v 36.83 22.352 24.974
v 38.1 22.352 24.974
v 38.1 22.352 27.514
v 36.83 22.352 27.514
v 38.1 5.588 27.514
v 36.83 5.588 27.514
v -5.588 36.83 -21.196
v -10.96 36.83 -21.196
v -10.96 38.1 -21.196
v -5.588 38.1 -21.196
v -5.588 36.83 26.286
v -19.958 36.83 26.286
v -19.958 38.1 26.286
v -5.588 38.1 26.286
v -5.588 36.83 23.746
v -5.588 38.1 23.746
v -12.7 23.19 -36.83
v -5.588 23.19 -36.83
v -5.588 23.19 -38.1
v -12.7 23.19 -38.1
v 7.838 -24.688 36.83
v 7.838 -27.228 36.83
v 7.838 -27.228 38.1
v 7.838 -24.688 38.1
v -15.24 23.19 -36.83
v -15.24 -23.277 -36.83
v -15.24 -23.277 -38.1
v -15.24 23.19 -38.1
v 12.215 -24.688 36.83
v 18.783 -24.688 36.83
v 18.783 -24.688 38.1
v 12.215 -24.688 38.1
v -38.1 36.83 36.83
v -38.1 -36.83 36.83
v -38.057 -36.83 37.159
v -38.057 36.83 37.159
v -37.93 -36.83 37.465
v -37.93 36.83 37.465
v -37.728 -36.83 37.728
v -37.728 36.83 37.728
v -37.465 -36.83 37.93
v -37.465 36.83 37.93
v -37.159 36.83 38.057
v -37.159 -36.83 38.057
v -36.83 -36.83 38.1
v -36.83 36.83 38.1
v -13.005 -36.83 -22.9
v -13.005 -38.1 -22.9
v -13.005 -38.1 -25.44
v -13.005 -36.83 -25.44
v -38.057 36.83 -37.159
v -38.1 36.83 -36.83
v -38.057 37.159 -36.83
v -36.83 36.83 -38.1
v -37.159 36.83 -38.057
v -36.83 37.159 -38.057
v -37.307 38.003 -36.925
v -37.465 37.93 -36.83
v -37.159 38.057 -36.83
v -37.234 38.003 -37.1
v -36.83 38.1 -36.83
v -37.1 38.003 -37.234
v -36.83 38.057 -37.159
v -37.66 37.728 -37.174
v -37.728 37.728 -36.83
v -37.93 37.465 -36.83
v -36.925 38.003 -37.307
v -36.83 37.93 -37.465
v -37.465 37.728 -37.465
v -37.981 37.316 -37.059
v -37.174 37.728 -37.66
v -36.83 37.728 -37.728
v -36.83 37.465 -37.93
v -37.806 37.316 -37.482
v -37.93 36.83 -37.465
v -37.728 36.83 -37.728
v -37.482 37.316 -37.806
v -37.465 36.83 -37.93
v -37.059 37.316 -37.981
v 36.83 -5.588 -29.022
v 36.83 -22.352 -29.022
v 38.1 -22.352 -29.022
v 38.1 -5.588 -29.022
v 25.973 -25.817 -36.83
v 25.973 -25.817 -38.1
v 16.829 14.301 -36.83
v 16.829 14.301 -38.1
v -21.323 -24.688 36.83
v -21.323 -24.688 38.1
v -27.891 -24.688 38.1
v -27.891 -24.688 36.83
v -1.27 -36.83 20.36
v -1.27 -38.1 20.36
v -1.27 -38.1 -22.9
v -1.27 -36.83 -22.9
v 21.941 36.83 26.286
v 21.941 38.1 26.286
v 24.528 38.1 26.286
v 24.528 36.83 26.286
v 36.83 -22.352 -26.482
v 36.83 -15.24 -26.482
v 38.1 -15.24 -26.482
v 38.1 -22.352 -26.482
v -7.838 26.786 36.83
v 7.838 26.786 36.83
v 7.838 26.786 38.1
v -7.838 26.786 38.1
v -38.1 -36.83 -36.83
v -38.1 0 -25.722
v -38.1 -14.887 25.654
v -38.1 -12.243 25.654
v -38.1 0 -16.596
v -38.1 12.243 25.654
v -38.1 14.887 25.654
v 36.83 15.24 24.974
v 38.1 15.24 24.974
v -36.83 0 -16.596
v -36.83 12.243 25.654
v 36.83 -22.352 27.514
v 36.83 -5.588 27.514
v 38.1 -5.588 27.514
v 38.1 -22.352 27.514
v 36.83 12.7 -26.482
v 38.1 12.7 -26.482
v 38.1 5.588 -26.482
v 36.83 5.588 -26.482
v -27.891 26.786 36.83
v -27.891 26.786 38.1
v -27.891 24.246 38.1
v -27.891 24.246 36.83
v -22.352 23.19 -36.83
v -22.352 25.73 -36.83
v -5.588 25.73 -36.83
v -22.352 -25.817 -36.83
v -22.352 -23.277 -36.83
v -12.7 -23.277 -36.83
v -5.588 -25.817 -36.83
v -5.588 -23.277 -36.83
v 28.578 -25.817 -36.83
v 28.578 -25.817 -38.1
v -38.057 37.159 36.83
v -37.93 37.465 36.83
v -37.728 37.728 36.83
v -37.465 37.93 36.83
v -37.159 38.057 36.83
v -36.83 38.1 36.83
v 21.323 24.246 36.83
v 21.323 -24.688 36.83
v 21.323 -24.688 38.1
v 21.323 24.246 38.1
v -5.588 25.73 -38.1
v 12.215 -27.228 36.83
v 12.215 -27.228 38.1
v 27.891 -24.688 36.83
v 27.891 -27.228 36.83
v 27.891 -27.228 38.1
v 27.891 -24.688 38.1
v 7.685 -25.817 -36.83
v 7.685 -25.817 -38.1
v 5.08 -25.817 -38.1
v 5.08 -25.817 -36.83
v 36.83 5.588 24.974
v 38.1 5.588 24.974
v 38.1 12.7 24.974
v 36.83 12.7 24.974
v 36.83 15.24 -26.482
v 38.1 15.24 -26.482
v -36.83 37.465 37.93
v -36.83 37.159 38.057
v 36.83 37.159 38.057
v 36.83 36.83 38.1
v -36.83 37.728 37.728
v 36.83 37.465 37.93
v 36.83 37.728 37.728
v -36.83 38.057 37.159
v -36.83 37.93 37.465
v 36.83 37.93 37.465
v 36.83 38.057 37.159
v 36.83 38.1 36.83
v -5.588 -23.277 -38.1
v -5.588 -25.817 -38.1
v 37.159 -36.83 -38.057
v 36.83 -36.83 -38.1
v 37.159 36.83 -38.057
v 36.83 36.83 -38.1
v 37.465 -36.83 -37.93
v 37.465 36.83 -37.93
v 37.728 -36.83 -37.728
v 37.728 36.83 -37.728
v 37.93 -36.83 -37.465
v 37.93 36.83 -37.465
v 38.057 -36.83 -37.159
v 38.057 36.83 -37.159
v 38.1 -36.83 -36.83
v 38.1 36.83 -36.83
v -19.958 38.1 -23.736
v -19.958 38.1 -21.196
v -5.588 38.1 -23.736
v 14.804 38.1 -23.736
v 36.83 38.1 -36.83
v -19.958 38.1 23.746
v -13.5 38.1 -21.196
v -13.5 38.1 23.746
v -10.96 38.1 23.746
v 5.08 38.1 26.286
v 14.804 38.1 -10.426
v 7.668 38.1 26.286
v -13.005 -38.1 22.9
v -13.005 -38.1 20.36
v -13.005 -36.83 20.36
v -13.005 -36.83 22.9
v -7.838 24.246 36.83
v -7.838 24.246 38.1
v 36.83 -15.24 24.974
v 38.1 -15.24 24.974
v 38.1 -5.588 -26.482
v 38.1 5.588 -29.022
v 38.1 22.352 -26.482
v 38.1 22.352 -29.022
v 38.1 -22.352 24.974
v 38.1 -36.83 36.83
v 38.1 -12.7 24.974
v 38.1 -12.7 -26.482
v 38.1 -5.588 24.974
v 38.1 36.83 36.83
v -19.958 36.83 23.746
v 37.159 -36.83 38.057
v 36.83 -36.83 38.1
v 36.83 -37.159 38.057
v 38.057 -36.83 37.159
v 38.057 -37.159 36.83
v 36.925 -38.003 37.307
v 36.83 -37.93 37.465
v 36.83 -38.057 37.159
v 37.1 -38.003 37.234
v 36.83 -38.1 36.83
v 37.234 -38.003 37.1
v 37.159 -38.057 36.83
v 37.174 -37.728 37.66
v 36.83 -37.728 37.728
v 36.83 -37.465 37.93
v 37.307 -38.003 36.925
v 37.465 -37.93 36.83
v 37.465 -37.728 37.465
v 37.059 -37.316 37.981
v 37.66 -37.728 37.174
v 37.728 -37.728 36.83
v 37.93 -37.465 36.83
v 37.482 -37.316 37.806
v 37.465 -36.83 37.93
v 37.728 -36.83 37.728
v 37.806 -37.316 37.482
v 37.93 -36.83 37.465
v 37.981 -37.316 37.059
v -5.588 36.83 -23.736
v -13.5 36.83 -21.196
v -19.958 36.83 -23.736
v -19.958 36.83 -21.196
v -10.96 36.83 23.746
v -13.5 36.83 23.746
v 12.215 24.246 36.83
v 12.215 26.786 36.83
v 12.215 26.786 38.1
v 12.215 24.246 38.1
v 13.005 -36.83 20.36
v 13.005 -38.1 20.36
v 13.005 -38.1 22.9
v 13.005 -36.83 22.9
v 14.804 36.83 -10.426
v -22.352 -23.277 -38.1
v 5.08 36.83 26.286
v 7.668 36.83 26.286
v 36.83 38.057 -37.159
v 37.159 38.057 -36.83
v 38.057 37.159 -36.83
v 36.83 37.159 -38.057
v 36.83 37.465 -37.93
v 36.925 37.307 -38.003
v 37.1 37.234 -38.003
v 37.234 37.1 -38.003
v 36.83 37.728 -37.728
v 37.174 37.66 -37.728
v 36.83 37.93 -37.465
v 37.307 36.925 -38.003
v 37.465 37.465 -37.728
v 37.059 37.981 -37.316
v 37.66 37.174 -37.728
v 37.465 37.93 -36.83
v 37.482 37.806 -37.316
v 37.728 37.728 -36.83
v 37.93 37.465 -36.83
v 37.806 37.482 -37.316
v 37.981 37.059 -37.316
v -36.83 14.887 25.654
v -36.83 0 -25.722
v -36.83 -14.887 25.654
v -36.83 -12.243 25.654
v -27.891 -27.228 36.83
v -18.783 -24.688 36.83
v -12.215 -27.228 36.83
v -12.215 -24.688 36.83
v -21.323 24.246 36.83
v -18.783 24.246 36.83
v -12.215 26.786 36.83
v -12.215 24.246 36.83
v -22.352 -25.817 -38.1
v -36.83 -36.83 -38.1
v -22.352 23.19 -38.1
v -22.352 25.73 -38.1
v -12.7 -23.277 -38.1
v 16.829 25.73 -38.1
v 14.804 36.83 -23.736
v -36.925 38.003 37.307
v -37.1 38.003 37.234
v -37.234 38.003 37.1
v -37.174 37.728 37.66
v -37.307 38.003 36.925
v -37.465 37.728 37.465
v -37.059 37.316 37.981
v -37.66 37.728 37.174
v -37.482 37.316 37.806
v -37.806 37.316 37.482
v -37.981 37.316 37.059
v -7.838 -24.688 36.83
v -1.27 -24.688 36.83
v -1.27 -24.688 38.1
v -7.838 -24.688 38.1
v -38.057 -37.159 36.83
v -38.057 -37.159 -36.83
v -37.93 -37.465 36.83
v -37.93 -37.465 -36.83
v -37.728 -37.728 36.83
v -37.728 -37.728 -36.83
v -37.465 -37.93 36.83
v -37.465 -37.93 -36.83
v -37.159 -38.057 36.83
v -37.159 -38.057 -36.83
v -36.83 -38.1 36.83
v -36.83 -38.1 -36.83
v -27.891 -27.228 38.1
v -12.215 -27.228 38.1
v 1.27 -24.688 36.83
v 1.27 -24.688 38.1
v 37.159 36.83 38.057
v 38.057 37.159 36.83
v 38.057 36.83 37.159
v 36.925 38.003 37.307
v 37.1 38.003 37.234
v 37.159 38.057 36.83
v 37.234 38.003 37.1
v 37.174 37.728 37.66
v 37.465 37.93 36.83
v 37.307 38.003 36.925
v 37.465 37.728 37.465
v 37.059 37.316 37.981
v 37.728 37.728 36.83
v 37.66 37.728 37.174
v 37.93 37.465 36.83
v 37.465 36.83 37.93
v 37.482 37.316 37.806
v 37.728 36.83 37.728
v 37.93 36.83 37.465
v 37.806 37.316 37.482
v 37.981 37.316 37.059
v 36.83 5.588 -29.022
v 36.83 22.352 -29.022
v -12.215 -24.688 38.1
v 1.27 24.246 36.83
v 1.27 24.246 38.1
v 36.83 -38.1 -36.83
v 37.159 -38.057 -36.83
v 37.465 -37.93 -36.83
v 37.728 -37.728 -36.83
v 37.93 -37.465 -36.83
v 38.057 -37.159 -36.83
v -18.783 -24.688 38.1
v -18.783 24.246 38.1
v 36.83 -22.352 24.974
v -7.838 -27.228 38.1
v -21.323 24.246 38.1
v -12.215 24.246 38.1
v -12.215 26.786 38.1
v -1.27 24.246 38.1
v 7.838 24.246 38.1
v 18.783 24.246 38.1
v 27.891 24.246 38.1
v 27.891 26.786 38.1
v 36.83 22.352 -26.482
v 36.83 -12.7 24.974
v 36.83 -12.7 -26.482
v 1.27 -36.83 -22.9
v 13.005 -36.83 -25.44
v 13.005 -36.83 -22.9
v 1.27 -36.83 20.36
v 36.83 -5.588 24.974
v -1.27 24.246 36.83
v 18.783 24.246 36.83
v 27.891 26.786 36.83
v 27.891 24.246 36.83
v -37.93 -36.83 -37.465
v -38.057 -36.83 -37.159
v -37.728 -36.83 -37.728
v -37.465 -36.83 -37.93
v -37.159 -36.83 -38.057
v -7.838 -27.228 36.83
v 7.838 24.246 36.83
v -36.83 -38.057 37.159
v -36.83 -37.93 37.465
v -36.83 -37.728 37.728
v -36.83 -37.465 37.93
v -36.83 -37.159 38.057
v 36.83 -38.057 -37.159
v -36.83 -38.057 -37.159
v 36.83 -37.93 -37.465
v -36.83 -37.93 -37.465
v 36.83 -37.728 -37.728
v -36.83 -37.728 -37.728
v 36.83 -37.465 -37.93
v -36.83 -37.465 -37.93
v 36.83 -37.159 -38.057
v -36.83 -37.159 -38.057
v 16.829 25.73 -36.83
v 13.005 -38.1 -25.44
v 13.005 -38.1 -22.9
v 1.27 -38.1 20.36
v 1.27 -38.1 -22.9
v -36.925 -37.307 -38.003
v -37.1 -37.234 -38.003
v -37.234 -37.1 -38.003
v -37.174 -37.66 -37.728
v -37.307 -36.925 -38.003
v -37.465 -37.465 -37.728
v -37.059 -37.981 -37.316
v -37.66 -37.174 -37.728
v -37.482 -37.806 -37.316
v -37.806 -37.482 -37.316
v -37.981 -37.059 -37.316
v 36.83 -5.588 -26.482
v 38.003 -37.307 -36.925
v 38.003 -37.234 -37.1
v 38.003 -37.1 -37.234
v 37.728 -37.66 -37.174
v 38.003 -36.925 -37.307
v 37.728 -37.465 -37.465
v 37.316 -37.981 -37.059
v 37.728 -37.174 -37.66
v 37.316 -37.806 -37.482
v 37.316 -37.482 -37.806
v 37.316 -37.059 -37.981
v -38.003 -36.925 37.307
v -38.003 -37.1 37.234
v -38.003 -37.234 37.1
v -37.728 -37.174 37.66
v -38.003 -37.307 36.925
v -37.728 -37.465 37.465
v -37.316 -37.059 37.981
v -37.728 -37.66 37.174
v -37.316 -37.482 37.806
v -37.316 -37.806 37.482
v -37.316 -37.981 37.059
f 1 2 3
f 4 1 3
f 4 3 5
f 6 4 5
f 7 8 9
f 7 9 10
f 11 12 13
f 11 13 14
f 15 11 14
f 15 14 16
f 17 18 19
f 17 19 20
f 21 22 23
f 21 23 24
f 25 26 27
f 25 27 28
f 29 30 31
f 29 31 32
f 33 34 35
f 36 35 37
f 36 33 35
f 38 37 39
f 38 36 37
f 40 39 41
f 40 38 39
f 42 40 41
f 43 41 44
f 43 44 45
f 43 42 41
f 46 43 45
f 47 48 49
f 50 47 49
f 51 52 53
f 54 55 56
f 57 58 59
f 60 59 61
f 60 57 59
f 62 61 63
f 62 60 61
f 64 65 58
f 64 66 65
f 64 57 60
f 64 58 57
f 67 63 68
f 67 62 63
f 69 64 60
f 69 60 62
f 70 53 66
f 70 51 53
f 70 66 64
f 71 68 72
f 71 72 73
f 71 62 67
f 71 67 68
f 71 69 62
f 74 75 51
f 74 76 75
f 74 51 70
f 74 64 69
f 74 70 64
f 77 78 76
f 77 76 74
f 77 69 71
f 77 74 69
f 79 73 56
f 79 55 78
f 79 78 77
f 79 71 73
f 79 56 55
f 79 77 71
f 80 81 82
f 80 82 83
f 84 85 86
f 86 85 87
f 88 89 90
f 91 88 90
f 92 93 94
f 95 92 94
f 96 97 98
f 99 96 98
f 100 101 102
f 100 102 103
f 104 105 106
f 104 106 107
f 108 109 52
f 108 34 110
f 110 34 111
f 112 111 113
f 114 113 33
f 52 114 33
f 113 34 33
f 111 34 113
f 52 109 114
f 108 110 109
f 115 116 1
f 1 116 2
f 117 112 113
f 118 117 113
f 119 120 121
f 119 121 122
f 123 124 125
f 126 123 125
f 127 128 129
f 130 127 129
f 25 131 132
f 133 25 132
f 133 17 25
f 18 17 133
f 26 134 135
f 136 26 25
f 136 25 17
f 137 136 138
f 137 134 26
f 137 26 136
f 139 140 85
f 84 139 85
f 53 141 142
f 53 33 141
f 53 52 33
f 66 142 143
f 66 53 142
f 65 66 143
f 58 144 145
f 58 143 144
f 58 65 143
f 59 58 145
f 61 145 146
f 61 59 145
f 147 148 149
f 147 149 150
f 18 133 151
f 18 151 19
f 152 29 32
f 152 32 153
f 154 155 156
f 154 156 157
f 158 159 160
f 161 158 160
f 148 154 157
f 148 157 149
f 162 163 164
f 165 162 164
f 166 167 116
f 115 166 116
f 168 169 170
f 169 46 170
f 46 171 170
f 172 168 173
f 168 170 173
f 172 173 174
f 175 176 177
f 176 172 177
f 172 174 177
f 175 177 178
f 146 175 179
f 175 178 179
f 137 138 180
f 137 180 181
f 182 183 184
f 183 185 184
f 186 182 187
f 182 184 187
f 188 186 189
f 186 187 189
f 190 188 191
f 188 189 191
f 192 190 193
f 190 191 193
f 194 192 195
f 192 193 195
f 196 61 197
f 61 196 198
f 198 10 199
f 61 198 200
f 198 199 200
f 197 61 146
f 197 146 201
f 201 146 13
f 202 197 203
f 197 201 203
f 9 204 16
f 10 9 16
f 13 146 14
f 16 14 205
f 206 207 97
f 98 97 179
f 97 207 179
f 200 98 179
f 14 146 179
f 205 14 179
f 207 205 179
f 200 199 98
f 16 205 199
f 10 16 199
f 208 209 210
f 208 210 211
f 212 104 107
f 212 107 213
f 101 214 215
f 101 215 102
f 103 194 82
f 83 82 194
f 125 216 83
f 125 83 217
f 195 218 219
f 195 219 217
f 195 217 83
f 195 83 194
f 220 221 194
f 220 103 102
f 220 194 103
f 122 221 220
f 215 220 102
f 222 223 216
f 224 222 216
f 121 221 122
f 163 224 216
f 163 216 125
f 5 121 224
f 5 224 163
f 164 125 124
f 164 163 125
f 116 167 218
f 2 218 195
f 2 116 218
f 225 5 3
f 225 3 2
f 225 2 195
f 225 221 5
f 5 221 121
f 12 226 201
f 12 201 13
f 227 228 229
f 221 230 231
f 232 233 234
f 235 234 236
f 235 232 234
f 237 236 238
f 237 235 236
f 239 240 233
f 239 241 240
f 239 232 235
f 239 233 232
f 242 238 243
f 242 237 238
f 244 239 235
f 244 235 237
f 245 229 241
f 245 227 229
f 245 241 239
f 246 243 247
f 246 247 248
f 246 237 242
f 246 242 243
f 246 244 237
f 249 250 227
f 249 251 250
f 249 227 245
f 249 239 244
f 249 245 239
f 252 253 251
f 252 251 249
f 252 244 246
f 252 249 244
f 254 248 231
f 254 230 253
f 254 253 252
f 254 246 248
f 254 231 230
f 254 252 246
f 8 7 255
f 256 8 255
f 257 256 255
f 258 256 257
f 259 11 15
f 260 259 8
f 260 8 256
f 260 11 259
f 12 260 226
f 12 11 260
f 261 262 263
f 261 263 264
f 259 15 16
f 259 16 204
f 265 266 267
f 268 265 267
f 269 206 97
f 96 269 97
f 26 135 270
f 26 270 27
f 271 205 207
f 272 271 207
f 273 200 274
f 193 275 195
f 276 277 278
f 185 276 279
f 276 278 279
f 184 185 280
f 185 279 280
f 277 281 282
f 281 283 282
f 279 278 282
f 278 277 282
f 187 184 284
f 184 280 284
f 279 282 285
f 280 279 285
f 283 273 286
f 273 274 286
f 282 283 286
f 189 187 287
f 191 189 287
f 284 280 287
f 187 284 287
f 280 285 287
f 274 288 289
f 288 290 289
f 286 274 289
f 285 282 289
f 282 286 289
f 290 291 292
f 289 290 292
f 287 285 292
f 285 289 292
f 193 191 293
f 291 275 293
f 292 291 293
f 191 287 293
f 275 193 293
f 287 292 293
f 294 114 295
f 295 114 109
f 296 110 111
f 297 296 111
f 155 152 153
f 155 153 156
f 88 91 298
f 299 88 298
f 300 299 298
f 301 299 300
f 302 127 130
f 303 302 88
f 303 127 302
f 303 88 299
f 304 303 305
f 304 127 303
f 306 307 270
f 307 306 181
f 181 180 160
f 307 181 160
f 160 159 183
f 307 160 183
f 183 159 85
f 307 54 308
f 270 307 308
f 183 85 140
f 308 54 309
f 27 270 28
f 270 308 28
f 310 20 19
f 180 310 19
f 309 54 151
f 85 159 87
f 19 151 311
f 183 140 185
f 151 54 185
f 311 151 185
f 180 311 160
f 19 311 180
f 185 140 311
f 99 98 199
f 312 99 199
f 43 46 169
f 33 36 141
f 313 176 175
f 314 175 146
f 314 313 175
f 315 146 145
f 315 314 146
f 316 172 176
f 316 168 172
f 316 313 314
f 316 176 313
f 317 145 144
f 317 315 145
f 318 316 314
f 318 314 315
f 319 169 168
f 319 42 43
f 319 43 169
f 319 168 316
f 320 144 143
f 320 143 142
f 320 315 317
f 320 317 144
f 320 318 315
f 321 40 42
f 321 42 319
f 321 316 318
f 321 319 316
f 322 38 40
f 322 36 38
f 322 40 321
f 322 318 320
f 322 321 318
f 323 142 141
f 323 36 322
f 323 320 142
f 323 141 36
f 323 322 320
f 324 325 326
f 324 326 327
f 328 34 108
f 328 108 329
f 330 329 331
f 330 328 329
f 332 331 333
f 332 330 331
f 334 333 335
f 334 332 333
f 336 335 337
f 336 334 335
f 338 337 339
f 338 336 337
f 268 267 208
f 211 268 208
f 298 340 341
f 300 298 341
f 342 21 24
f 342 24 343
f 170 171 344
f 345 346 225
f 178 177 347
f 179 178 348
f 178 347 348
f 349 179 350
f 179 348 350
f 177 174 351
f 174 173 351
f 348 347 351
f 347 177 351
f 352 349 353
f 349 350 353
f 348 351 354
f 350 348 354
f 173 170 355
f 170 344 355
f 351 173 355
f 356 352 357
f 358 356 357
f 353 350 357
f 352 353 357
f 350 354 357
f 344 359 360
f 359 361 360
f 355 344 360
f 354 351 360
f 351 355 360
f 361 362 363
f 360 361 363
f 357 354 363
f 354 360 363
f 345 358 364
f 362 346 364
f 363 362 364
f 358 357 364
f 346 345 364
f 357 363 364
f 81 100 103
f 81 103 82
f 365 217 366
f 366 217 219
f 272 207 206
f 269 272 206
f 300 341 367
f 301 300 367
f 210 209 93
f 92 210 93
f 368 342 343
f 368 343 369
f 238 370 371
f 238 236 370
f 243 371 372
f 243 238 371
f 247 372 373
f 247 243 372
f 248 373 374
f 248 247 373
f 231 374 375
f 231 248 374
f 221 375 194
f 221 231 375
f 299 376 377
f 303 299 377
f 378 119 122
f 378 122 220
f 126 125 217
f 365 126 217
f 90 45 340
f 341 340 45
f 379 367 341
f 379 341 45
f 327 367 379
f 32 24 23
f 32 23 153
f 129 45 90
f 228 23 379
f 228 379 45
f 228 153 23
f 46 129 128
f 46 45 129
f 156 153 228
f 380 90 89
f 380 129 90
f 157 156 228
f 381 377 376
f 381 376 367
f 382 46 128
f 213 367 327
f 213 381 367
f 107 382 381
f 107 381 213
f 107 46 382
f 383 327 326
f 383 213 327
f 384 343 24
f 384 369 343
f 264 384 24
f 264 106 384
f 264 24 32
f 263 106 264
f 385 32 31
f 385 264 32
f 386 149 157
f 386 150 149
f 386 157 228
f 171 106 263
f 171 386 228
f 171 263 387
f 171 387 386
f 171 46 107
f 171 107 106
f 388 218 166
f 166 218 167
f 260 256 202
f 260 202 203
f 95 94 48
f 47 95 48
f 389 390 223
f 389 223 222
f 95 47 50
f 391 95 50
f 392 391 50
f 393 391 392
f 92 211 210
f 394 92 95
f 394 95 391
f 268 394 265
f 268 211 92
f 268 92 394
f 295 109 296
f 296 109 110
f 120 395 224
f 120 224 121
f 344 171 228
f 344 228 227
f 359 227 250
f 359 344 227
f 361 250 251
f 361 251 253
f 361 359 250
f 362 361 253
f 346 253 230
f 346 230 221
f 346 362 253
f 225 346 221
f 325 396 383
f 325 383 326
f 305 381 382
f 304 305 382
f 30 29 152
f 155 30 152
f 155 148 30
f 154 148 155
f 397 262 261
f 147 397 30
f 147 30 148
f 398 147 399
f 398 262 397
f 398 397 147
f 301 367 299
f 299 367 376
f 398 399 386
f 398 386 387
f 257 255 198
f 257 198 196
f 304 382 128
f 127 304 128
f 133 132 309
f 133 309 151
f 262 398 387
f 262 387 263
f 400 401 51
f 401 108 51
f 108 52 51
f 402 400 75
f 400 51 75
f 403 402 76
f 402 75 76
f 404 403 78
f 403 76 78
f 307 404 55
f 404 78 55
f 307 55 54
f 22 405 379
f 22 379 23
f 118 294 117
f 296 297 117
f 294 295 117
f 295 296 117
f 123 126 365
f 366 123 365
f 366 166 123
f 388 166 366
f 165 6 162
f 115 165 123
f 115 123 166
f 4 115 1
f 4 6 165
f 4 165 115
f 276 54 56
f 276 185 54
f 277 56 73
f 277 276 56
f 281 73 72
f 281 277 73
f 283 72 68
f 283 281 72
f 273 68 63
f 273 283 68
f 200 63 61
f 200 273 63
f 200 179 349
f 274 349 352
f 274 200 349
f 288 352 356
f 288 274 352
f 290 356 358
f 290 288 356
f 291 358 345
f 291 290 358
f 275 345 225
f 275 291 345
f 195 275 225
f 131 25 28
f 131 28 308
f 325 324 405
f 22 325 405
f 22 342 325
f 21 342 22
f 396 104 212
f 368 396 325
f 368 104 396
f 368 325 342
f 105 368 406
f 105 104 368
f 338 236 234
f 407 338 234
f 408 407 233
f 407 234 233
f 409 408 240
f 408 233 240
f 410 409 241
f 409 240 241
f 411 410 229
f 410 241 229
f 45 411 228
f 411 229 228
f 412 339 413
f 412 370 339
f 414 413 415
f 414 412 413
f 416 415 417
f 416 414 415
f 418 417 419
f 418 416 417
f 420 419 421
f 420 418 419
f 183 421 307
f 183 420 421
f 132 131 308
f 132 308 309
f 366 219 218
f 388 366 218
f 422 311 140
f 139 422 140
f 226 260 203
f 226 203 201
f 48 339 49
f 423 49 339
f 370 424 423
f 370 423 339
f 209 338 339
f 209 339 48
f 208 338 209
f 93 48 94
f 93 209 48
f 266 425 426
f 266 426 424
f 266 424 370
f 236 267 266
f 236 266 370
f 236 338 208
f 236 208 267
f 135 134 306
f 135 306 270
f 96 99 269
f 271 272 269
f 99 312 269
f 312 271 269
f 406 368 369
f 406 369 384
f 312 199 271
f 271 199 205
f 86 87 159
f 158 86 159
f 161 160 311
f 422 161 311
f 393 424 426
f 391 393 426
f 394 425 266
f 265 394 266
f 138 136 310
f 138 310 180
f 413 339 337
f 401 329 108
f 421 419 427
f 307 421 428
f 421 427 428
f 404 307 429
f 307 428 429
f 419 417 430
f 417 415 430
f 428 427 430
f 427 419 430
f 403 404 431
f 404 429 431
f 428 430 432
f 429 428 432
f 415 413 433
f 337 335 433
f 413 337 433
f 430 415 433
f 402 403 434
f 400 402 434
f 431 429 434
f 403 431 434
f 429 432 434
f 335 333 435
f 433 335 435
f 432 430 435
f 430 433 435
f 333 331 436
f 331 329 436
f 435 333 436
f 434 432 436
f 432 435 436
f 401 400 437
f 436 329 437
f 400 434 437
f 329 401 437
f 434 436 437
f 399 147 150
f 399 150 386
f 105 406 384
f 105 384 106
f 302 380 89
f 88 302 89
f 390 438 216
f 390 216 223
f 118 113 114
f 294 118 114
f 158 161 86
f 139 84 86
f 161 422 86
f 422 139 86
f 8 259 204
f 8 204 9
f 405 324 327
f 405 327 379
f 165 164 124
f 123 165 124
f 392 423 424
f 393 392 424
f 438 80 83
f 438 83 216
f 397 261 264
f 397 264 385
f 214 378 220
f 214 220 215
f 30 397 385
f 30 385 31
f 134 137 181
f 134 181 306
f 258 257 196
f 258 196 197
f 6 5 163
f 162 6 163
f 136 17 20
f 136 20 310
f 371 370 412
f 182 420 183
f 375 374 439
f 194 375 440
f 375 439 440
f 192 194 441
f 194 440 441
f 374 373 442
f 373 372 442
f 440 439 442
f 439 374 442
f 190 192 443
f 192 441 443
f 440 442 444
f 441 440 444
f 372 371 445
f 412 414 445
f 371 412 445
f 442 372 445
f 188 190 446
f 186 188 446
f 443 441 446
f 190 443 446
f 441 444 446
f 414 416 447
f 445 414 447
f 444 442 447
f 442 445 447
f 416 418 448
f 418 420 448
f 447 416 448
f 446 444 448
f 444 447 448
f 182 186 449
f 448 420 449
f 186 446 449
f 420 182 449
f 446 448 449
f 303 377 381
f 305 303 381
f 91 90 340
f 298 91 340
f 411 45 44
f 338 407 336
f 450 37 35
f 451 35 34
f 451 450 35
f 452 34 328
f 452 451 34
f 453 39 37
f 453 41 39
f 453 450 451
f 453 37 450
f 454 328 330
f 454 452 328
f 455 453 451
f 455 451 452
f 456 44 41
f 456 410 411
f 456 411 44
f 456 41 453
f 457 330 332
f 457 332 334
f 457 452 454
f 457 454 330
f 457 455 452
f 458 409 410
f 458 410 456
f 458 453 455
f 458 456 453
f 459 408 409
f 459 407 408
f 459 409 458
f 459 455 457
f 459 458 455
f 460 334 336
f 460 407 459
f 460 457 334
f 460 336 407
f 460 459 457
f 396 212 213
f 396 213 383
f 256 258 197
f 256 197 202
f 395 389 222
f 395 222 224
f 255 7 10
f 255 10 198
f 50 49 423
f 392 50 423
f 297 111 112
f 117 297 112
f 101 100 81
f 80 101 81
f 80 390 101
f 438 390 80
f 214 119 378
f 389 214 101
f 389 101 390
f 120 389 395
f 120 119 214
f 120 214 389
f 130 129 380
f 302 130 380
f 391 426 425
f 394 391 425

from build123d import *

# Parameters (mm, degrees)
F0_W      = 76.2
F0_H      = 76.2
F1_DEPTH  = 38.1
F2_W      = 11.73516
F2_H      = 2.54
F3_DEPTH  = 1.27
F5_DEPTH  = 1.27
F7_DEPTH  = 1.27
F9_DEPTH  = 1.27
F11_DEPTH = 1.27
F13_DEPTH = 1.27
F14_R     = 1.27


with BuildPart() as f1:
    # F0 (on Top) → F1 (new body, symmetric)
    with BuildSketch(Plane.XY):
        Rectangle(F0_W, F0_H)
    extrude(amount=F1_DEPTH, both=True)

    # F2 (on face) → F3 (cut, symmetric)
    with BuildSketch(Plane.XZ.offset(38.1)):
        with Locations((-7.13758, 21.63039)):
            Rectangle(F2_W, F2_H)
        Polygon((0, 22.90039), (-1.27, 22.90039), (-1.27, 20.36039), (0, 20.36039), (1.27, 20.36039), (1.27, 22.90039), align=None)
        Polygon((0, 20.36039), (-1.27, 20.36039), (-1.27, 0), (-1.27, -22.90039), (0, -22.90039), (1.27, -22.90039), (1.27, 0), (1.27, 20.36039), align=None)
        with Locations((7.13758, 21.63039)):
            Rectangle(F2_W, F2_H)
        Polygon((0, -22.90039), (-1.27, -22.90039), (-13.00516, -22.90039), (-13.00516, -25.44039), (0, -25.44039), (13.00516, -25.44039), (13.00516, -22.90039), (1.27, -22.90039), align=None)
    extrude(amount=F3_DEPTH, both=True, mode=Mode.SUBTRACT)

    # F4 (on face) → F5 (cut, symmetric)
    with BuildSketch(Plane(origin=(0, 38.1, 0), x_dir=(-1, 0, 0), z_dir=(0, 1, 0))):
        Polygon((5.588, 26.286197), (5.588, 23.746197), (10.960088, 23.746197), (12.230088, 23.746197), (13.500088, 23.746197), (19.957788, 23.746197), (19.957788, 26.286197), (12.230088, 26.286197), align=None)
        Polygon((12.230088, 23.746197), (10.960088, 23.746197), (10.960088, -21.1963), (12.230088, -21.1963), (13.500088, -21.1963), (13.500088, 23.746197), align=None)
        Polygon((12.230088, -21.1963), (10.960088, -21.1963), (5.588, -21.1963), (5.588, -23.7363), (12.230088, -23.7363), (19.957788, -23.7363), (19.957788, -21.1963), (13.500088, -21.1963), align=None)
        Polygon((-7.667548, 26.286197), (-14.804196, -10.425624), (-21.940843, 26.286197), (-24.528392, 26.286197), (-14.804196, -23.7363), (-5.08, 26.286197), align=None)
    extrude(amount=F5_DEPTH, both=True, mode=Mode.SUBTRACT)

    # F6 (on face) → F7 (cut, symmetric)
    with BuildSketch(Plane(origin=(-38.1, 0, 0), x_dir=(0, -1, 0), z_dir=(-1, 0, 0))):
        Polygon((-14.887291, 25.654), (0, -25.721655), (14.887291, 25.654), (12.2428, 25.654), (0, -16.595586), (-12.2428, 25.654), align=None)
    extrude(amount=F7_DEPTH, both=True, mode=Mode.SUBTRACT)

    # F8 (on face) → F9 (cut, symmetric)
    with BuildSketch(Plane.YZ.offset(38.1)):
        Polygon((-22.352, 27.513674), (-22.352, 24.973674), (-15.24, 24.973674), (-13.97, 24.973674), (-12.7, 24.973674), (-5.588, 24.973674), (-5.588, 27.513674), (-13.97, 27.513674), align=None)
        Polygon((-13.97, 24.973674), (-15.24, 24.973674), (-15.24, -26.48152), (-13.97, -26.48152), (-12.7, -26.48152), (-12.7, 24.973674), align=None)
        Polygon((-13.97, -26.48152), (-15.24, -26.48152), (-22.352, -26.48152), (-22.352, -29.02152), (-13.97, -29.02152), (-5.588, -29.02152), (-5.588, -26.48152), (-12.7, -26.48152), align=None)
        Polygon((13.97, 24.973674), (12.7, 24.973674), (12.7, -26.48152), (13.97, -26.48152), (15.24, -26.48152), (15.24, 24.973674), align=None)
        Polygon((5.588, 24.973674), (12.7, 24.973674), (13.97, 24.973674), (15.24, 24.973674), (22.352, 24.973674), (22.352, 27.513674), (13.97, 27.513674), (5.588, 27.513674), align=None)
        Polygon((13.97, -26.48152), (12.7, -26.48152), (5.588, -26.48152), (5.588, -29.02152), (13.97, -29.02152), (22.352, -29.02152), (22.352, -26.48152), (15.24, -26.48152), align=None)
    extrude(amount=F9_DEPTH, both=True, mode=Mode.SUBTRACT)

    # F10 (on face) → F11 (cut, symmetric)
    with BuildSketch(Plane(origin=(0, 0, -38.1), x_dir=(1, 0, 0), z_dir=(0, 0, -1))):
        Polygon((-22.352, 25.81735), (-22.352, 23.27735), (-15.24, 23.27735), (-13.97, 23.27735), (-12.7, 23.27735), (-5.588, 23.27735), (-5.588, 25.81735), (-13.97, 25.81735), align=None)
        Polygon((-13.97, 23.27735), (-15.24, 23.27735), (-15.24, -23.1902), (-13.97, -23.1902), (-12.7, -23.1902), (-12.7, 23.27735), align=None)
        Polygon((-13.97, -23.1902), (-15.24, -23.1902), (-22.352, -23.1902), (-22.352, -25.7302), (-13.97, -25.7302), (-5.588, -25.7302), (-5.588, -23.1902), (-12.7, -23.1902), align=None)
        Polygon((5.08, 25.81735), (16.829143, -25.7302), (28.578286, 25.81735), (25.973143, 25.81735), (16.829143, -14.300538), (7.685143, 25.81735), align=None)
    extrude(amount=F11_DEPTH, both=True, mode=Mode.SUBTRACT)

    # F12 (on face) → F13 (cut, symmetric)
    with BuildSketch(Plane.XY.offset(38.1)):
        Polygon((27.891114, -27.228153), (27.891114, -24.688153), (21.323074, -24.688153), (20.053074, -24.688153), (18.783074, -24.688153), (12.215033, -24.688153), (12.215033, -27.228153), (20.053074, -27.228153), align=None)
        Polygon((20.053074, -24.688153), (21.323074, -24.688153), (21.323074, 24.24637), (20.053074, 24.24637), (18.783074, 24.24637), (18.783074, -24.688153), align=None)
        Polygon((20.053074, 24.24637), (21.323074, 24.24637), (27.891114, 24.24637), (27.891114, 26.78637), (20.053074, 26.78637), (12.215033, 26.78637), (12.215033, 24.24637), (18.783074, 24.24637), align=None)
        Polygon((7.83804, -27.228153), (7.83804, -24.688153), (1.27, -24.688153), (0, -24.688153), (-1.27, -24.688153), (-7.83804, -24.688153), (-7.83804, -27.228153), (-0.004473, -27.228153), (0.004473, -27.228153), align=None)
        Polygon((0, -24.688153), (1.27, -24.688153), (1.27, 24.24637), (0, 24.24637), (-1.27, 24.24637), (-1.27, -24.688153), align=None)
        Polygon((0, 24.24637), (1.27, 24.24637), (7.83804, 24.24637), (7.83804, 26.78637), (0, 26.78637), (-7.83804, 26.78637), (-7.83804, 24.24637), (-1.27, 24.24637), align=None)
        Polygon((-20.053074, -27.228153), (-12.215033, -27.228153), (-12.215033, -24.688153), (-18.783074, -24.688153), (-20.053074, -24.688153), (-21.323074, -24.688153), (-27.891114, -24.688153), (-27.891114, -27.228153), align=None)
        Polygon((-20.053074, -24.688153), (-18.783074, -24.688153), (-18.783074, 24.24637), (-20.053074, 24.24637), (-21.323074, 24.24637), (-21.323074, -24.688153), align=None)
        Polygon((-20.053074, 24.24637), (-18.783074, 24.24637), (-12.215033, 24.24637), (-12.215033, 26.78637), (-20.053074, 26.78637), (-27.891114, 26.78637), (-27.891114, 24.24637), (-21.323074, 24.24637), align=None)
    extrude(amount=F13_DEPTH, both=True, mode=Mode.SUBTRACT)

    # F14
    f14_edges = [f1.edges().sort_by_distance(p)[0] for p in [
        (38.1, 0, 38.1),
        (0, -38.1, 38.1),
        (-38.1, 0, 38.1),
        (0, 38.1, 38.1),
        (-38.1, -38.1, 0),
        (0, -38.1, -38.1),
        (38.1, -38.1, 0),
        (-38.1, 0, -38.1),
        (-38.1, 38.1, 0),
        (38.1, 38.1, 0),
        (0, 38.1, -38.1),
        (38.1, 0, -38.1),
    ]]
    fillet(f14_edges, radius=F14_R)


solid = f1.part
